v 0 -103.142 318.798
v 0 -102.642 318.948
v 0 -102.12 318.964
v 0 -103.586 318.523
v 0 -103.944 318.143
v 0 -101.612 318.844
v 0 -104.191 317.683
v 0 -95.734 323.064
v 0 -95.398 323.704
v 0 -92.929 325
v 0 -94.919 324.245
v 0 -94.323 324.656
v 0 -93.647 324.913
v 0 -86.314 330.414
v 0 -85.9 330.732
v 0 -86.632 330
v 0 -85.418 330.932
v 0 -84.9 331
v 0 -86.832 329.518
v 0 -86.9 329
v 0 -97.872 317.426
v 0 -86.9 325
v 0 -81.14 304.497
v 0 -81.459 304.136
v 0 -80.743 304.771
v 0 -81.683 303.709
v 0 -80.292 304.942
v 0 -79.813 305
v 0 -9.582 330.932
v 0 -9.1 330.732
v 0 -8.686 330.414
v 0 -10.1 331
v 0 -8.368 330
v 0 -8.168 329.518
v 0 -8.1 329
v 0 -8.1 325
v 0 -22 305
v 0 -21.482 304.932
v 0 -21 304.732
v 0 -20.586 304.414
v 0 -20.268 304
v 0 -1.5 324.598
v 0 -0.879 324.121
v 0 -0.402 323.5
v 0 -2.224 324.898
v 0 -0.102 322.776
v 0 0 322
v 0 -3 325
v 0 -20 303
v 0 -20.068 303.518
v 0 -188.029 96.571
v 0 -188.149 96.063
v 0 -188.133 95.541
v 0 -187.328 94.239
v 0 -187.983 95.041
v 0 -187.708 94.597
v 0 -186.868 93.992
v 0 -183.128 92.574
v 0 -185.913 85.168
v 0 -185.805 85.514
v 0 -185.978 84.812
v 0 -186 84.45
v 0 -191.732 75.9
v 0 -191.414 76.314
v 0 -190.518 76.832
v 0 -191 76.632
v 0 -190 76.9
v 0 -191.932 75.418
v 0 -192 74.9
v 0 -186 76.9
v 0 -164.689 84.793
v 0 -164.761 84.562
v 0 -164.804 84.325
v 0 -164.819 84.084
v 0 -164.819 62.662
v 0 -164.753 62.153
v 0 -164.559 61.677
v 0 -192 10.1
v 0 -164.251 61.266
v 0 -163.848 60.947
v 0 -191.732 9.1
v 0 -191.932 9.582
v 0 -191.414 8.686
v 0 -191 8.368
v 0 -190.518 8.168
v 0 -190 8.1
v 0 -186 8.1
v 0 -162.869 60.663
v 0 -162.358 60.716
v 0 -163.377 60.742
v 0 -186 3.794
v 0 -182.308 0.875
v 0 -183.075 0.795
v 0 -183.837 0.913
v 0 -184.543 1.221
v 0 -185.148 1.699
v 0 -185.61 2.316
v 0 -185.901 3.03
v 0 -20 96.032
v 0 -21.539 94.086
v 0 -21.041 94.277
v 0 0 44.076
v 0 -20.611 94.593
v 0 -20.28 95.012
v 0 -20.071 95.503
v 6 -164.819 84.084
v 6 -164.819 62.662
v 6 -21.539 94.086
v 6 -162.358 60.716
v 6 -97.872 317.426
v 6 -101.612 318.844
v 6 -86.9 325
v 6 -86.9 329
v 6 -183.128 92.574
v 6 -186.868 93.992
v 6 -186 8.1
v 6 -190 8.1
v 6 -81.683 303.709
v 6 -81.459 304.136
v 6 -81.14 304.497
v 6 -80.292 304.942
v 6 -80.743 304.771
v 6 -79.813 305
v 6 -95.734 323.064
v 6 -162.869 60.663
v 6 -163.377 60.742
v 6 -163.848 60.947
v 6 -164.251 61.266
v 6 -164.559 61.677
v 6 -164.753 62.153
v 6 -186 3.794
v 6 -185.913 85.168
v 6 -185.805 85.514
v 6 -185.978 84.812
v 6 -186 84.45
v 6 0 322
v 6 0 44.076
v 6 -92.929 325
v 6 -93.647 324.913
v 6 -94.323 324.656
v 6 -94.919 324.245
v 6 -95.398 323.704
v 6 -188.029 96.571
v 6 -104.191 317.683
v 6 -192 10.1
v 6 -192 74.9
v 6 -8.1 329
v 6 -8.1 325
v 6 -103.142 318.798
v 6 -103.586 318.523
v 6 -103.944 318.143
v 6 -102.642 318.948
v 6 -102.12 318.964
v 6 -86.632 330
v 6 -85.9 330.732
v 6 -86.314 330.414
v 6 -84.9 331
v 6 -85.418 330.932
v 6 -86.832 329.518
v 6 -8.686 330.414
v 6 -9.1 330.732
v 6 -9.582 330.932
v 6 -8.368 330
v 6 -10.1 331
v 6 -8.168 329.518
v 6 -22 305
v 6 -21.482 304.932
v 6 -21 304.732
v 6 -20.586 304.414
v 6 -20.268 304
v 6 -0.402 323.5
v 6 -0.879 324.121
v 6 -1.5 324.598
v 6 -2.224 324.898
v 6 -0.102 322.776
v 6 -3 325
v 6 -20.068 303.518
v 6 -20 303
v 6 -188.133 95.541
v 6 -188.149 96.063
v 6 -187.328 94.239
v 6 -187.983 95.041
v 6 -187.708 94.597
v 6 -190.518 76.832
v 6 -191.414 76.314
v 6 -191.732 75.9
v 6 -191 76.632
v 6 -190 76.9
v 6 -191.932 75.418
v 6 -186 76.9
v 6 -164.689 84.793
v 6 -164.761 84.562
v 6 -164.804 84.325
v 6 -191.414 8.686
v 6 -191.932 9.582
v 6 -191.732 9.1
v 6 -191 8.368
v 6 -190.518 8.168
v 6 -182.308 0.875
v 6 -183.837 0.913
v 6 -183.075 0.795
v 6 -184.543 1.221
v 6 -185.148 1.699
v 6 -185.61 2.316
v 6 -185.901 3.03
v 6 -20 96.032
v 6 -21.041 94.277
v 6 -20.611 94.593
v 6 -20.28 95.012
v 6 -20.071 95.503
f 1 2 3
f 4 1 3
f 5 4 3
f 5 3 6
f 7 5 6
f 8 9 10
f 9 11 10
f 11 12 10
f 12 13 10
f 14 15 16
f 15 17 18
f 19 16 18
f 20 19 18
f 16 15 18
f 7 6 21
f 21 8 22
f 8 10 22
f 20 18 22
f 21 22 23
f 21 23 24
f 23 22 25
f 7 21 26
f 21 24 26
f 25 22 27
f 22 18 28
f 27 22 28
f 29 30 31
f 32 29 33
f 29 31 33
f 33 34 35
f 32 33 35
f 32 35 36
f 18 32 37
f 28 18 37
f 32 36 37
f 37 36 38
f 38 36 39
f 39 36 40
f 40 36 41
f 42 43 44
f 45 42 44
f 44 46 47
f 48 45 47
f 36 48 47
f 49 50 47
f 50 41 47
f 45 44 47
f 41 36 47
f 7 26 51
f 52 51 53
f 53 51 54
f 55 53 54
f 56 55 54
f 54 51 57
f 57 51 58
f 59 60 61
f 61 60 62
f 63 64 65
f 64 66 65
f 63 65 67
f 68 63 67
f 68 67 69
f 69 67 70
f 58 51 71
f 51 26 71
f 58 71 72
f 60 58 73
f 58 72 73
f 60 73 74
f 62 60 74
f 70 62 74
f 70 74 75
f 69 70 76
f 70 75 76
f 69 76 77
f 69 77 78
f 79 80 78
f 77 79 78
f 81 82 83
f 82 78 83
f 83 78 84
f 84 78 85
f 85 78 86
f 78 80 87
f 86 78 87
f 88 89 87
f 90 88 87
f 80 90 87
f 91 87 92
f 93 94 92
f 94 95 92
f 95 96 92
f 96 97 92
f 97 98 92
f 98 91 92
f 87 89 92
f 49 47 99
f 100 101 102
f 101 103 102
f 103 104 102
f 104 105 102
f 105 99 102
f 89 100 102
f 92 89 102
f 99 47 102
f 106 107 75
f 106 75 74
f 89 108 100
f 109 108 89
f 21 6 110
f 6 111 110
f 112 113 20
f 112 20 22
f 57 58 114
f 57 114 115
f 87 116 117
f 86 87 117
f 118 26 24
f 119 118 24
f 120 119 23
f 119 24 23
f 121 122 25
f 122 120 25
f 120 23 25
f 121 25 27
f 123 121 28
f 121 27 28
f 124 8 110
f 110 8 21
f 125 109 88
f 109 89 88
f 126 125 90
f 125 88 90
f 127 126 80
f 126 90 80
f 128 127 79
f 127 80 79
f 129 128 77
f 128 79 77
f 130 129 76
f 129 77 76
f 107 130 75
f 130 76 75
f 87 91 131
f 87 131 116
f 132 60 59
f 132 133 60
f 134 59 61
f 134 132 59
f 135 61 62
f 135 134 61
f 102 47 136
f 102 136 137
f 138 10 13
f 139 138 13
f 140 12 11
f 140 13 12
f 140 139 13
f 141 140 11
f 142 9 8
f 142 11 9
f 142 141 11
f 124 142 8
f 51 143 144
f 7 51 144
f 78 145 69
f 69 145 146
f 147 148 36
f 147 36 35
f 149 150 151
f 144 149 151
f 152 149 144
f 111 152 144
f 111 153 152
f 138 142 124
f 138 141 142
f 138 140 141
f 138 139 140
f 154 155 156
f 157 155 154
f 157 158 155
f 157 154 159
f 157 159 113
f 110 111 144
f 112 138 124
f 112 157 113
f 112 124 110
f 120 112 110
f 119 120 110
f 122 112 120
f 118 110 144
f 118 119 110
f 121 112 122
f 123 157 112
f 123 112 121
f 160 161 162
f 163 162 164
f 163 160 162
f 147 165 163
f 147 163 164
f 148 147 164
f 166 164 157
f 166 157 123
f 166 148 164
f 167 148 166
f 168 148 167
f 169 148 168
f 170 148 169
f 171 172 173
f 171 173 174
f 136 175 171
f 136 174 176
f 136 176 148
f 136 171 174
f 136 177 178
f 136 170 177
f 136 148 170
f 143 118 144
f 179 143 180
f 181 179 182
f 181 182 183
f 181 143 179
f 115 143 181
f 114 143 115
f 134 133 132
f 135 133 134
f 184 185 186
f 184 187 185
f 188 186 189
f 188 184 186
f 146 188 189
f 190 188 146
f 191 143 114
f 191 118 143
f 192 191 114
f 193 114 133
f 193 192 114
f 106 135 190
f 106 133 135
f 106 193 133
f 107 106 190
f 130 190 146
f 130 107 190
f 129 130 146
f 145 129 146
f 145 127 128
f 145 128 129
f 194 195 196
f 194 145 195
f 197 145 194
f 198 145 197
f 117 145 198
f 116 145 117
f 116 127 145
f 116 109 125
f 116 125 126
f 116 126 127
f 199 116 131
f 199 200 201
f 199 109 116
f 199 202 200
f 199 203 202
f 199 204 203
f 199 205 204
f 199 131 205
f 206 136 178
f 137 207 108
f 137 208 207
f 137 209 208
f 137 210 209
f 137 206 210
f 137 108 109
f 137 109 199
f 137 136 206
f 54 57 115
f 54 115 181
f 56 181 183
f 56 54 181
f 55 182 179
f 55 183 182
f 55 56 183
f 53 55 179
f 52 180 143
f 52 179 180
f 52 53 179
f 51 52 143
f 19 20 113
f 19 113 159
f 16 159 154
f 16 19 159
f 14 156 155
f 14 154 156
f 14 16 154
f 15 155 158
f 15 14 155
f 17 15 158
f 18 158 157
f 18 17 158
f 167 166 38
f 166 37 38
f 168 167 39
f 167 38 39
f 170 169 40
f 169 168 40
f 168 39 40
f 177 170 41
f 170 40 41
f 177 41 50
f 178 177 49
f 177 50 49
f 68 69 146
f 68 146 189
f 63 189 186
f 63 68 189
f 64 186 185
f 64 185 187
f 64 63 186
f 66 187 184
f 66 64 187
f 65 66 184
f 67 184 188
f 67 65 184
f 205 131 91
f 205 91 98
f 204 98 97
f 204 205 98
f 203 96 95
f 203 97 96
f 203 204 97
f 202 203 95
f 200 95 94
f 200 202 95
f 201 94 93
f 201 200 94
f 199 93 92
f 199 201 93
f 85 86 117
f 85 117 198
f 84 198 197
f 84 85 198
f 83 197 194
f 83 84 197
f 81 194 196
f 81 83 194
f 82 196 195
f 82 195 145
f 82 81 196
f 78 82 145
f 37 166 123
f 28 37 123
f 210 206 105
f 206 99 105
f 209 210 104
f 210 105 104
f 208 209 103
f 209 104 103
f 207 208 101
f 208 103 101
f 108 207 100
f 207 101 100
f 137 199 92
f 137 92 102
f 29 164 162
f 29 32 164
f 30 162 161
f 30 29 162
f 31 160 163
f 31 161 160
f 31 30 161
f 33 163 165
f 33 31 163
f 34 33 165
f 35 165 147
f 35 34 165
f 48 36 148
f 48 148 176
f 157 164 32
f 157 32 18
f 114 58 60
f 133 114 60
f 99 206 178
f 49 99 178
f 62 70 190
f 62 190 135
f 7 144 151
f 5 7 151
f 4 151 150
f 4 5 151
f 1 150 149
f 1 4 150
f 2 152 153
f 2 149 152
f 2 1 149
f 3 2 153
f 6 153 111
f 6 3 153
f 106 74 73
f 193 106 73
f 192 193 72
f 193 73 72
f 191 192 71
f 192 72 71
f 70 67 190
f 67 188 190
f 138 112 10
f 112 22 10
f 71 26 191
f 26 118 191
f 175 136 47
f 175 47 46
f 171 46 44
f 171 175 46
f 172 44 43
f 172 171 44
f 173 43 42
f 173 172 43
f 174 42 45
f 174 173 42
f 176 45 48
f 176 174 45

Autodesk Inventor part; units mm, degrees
ref_plane "YZ Plane" through (0, 0, 0) normal (1, 0, 0) x (0, 1, 0)
ref_plane "XZ Plane" through (0, 0, 0) normal (0, 1, 0) x (-1, 0, 0)
ref_plane "XY Plane" through (0, 0, 0) normal (0, 0, 1) x (1, 0, 0)
sketch "Sketch1" plane through (0, 0, 0) normal (1, 0, 0) x (0, 1, 0)
  line L0 (0, 325) -> (0, 0)
  line L1 (0, 0) -> (-186, 0)
  line L2 (-186, 0) -> (-186, 85)
  line L3 (-2.414491, 325) -> (0, 325)
  line L4 (0, 325) -> (-95, 325)
  line L5 (-95, 325) -> (-186, 85)
  dimension "d0" = 325
  dimension "d1" = 186
  dimension "d2" = 85
  dimension "d3" = 95
  dimension "d33" = 240
  dimension "d34" = 91
extrude "Extrusion1" add sketch "Sketch1" along normal blind 6
sketch "Sketch2" plane through (6, 0, 0) normal (1, 0, 0) x (0, 0, -1)
  line L0 (-325, 0) -> (-325, -95) projected
  line L1 (-325, -8.1) -> (-331, -8.1)
  line L2 (-331, -8.1) -> (-331, -86.9)
  line L3 (-331, -86.9) -> (-325, -86.9)
  line L4 (-325, -86.9) -> (-325, -8.1)
  line L5 (-85, -186) -> (0, -186) projected
  line L6 (0, -186) -> (0, 0) projected
  line L7 (-76.9, -186) -> (-8.1, -186)
  line L8 (-8.1, -186) -> (-8.1, -192)
  line L9 (-8.1, -192) -> (-76.9, -192)
  line L10 (-76.9, -192) -> (-76.9, -186)
  line L11 (-325, -95) -> (-331, -86.9) construction
  line L12 (-325, 0) -> (-331, -8.1) construction
  dimension "d6" = 6
  dimension "d12" = 6
  dimension "d13" = 8.1
  dimension "d47" = 8.1
  dimension "d48" = 8.1
extrude "Extrusion2" add sketch "Sketch2" against normal blind 6
sketch "Sketch3" plane through (6, 0, 0) normal (1, 0, 0) x (0, 0, -1)
  line L0 (-317.426159, -97.871748) -> (-92.573841, -183.128252)
  line L1 (-92.573841, -183.128252) -> (-94.701061, -188.738504)
  line L2 (-94.701061, -188.738504) -> (-319.55338, -103.482)
  line L3 (-319.55338, -103.482) -> (-317.426159, -97.871748)
  line L4 (-325, -95) -> (-85, -186)
  dimension "d17" = 8.1
  dimension "d35" = 6
  dimension "d36" = 8.1
extrude "Extrusion3" add sketch "Sketch3" against normal blind 6
sketch "Sketch6" plane through (6, 0, 0) normal (1, 0, 0) x (0, 0, -1)
  line L0 (0, 0) -> (-325, 0) projected
  line L1 (0, -186) -> (0, 0) projected
  line L2 (0, -186) -> (-50, 25)
  line L3 (-50, 25) -> (0, 25)
  line L4 (0, 25) -> (0, -186)
  dimension "d38" = 50
  dimension "d39" = 25
extrude "Extrusion6" cut sketch "Sketch6" against normal through all
fillet "Fillet2" radius 3 4 edges at (3, 0, 325) (3, -95, 325) (3, -186, 85) (3, -186, 0)
fillet "Fillet3" radius 2 6 edges at (3, -192, 8.1) (3, -192, 76.9) (3, -188.7385, 94.7011) (3, -103.482, 319.5534) (3, -86.9, 331) (3, -8.1, 331)
sketch "Sketch4" plane through (6, 0, 0) normal (1, 0, 0) x (0, 0, -1)
  line L0 (-323.06361, -95.734214) -> (-85.513953, -185.805126)
  line L1 (-323.06361, -95.734214) -> (-85.513953, -185.805126)
  line L2 (-44.075829, 0) -> (-322, 0)
  line L3 (-325, -3) -> (-325, -8.1)
  line L4 (-325, -8.1) -> (-329, -8.1)
  line L5 (-305, -20) -> (-305, -81.193921)
  line L6 (-305, -81.193921) -> (-84.450343, -164.819)
  line L7 (-84.450343, -164.819) -> (-84.450343, -20)
  line L8 (-84.450343, -20) -> (-305, -20)
  arc A0 (-85.513953, -185.805126) -> (-84.450343, -186) centre (-84.450343, -183) ccw
  line L9 (-8.1, -186) -> (-3.79398, -186)
  point P0 (-191.521346, -165.651434)
  point P1 (-106.085382, -201.605735)
  point P2 (-3, 0)
  point P3 (0, 0)
  dimension "d24" = 20
  dimension "d26" = 20
  dimension "d27" = 20
extrude "Extrusion4" cut sketch "Sketch4" against normal through all
sketch "Sketch7" plane through (6, 0, 0) normal (1, 0, 0) x (0, 0, -1)
  line L0 (-84.450343, -20) -> (-84.450343, -164.819)
  line L1 (-0.874821, -182.308256) -> (-44.075829, 0)
  line L2 (-84.450343, -164.819) -> (-84.450343, -20)
  line L3 (-84.450343, -20) -> (-50.133044, -164.819)
  line L4 (-50.133044, -164.819) -> (-84.450343, -164.819)
  point P0 (0, 0)
extrude "Extrusion7" cut sketch "Sketch7" against normal through all
sketch "Sketch8" plane through (6, 0, 0) normal (1, 0, 0) x (0, 0, -1)
  line L0 (-84.450343, -20) -> (-50.133044, -164.819)
  line L1 (-50.133044, -164.819) -> (-84.450343, -164.819)
  line L2 (-305, -20) -> (-84.450343, -20)
  line L3 (-50.133044, -164.819) -> (-84.450343, -20)
  line L4 (-84.450343, -20) -> (-94.450343, -20)
  line L5 (-50.133044, -164.819) -> (-60.133044, -164.819)
  line L6 (-94.450343, -20) -> (-60.133044, -164.819)
  point P0 (0, 0)
  dimension "d44" = 10
extrude "Extrusion8" add sketch "Sketch8" against normal blind 6
fillet "Fillet4" radius 2 5 edges at (3, -164.819, 84.4503) (3, -164.819, 60.133) (3, -20, 94.4503) (3, -20, 305) (3, -81.1939, 305)
equation "\"d26\" = d24"
equation "\"d27\" = d24"
properties part number "TopSidePanel-Left"
